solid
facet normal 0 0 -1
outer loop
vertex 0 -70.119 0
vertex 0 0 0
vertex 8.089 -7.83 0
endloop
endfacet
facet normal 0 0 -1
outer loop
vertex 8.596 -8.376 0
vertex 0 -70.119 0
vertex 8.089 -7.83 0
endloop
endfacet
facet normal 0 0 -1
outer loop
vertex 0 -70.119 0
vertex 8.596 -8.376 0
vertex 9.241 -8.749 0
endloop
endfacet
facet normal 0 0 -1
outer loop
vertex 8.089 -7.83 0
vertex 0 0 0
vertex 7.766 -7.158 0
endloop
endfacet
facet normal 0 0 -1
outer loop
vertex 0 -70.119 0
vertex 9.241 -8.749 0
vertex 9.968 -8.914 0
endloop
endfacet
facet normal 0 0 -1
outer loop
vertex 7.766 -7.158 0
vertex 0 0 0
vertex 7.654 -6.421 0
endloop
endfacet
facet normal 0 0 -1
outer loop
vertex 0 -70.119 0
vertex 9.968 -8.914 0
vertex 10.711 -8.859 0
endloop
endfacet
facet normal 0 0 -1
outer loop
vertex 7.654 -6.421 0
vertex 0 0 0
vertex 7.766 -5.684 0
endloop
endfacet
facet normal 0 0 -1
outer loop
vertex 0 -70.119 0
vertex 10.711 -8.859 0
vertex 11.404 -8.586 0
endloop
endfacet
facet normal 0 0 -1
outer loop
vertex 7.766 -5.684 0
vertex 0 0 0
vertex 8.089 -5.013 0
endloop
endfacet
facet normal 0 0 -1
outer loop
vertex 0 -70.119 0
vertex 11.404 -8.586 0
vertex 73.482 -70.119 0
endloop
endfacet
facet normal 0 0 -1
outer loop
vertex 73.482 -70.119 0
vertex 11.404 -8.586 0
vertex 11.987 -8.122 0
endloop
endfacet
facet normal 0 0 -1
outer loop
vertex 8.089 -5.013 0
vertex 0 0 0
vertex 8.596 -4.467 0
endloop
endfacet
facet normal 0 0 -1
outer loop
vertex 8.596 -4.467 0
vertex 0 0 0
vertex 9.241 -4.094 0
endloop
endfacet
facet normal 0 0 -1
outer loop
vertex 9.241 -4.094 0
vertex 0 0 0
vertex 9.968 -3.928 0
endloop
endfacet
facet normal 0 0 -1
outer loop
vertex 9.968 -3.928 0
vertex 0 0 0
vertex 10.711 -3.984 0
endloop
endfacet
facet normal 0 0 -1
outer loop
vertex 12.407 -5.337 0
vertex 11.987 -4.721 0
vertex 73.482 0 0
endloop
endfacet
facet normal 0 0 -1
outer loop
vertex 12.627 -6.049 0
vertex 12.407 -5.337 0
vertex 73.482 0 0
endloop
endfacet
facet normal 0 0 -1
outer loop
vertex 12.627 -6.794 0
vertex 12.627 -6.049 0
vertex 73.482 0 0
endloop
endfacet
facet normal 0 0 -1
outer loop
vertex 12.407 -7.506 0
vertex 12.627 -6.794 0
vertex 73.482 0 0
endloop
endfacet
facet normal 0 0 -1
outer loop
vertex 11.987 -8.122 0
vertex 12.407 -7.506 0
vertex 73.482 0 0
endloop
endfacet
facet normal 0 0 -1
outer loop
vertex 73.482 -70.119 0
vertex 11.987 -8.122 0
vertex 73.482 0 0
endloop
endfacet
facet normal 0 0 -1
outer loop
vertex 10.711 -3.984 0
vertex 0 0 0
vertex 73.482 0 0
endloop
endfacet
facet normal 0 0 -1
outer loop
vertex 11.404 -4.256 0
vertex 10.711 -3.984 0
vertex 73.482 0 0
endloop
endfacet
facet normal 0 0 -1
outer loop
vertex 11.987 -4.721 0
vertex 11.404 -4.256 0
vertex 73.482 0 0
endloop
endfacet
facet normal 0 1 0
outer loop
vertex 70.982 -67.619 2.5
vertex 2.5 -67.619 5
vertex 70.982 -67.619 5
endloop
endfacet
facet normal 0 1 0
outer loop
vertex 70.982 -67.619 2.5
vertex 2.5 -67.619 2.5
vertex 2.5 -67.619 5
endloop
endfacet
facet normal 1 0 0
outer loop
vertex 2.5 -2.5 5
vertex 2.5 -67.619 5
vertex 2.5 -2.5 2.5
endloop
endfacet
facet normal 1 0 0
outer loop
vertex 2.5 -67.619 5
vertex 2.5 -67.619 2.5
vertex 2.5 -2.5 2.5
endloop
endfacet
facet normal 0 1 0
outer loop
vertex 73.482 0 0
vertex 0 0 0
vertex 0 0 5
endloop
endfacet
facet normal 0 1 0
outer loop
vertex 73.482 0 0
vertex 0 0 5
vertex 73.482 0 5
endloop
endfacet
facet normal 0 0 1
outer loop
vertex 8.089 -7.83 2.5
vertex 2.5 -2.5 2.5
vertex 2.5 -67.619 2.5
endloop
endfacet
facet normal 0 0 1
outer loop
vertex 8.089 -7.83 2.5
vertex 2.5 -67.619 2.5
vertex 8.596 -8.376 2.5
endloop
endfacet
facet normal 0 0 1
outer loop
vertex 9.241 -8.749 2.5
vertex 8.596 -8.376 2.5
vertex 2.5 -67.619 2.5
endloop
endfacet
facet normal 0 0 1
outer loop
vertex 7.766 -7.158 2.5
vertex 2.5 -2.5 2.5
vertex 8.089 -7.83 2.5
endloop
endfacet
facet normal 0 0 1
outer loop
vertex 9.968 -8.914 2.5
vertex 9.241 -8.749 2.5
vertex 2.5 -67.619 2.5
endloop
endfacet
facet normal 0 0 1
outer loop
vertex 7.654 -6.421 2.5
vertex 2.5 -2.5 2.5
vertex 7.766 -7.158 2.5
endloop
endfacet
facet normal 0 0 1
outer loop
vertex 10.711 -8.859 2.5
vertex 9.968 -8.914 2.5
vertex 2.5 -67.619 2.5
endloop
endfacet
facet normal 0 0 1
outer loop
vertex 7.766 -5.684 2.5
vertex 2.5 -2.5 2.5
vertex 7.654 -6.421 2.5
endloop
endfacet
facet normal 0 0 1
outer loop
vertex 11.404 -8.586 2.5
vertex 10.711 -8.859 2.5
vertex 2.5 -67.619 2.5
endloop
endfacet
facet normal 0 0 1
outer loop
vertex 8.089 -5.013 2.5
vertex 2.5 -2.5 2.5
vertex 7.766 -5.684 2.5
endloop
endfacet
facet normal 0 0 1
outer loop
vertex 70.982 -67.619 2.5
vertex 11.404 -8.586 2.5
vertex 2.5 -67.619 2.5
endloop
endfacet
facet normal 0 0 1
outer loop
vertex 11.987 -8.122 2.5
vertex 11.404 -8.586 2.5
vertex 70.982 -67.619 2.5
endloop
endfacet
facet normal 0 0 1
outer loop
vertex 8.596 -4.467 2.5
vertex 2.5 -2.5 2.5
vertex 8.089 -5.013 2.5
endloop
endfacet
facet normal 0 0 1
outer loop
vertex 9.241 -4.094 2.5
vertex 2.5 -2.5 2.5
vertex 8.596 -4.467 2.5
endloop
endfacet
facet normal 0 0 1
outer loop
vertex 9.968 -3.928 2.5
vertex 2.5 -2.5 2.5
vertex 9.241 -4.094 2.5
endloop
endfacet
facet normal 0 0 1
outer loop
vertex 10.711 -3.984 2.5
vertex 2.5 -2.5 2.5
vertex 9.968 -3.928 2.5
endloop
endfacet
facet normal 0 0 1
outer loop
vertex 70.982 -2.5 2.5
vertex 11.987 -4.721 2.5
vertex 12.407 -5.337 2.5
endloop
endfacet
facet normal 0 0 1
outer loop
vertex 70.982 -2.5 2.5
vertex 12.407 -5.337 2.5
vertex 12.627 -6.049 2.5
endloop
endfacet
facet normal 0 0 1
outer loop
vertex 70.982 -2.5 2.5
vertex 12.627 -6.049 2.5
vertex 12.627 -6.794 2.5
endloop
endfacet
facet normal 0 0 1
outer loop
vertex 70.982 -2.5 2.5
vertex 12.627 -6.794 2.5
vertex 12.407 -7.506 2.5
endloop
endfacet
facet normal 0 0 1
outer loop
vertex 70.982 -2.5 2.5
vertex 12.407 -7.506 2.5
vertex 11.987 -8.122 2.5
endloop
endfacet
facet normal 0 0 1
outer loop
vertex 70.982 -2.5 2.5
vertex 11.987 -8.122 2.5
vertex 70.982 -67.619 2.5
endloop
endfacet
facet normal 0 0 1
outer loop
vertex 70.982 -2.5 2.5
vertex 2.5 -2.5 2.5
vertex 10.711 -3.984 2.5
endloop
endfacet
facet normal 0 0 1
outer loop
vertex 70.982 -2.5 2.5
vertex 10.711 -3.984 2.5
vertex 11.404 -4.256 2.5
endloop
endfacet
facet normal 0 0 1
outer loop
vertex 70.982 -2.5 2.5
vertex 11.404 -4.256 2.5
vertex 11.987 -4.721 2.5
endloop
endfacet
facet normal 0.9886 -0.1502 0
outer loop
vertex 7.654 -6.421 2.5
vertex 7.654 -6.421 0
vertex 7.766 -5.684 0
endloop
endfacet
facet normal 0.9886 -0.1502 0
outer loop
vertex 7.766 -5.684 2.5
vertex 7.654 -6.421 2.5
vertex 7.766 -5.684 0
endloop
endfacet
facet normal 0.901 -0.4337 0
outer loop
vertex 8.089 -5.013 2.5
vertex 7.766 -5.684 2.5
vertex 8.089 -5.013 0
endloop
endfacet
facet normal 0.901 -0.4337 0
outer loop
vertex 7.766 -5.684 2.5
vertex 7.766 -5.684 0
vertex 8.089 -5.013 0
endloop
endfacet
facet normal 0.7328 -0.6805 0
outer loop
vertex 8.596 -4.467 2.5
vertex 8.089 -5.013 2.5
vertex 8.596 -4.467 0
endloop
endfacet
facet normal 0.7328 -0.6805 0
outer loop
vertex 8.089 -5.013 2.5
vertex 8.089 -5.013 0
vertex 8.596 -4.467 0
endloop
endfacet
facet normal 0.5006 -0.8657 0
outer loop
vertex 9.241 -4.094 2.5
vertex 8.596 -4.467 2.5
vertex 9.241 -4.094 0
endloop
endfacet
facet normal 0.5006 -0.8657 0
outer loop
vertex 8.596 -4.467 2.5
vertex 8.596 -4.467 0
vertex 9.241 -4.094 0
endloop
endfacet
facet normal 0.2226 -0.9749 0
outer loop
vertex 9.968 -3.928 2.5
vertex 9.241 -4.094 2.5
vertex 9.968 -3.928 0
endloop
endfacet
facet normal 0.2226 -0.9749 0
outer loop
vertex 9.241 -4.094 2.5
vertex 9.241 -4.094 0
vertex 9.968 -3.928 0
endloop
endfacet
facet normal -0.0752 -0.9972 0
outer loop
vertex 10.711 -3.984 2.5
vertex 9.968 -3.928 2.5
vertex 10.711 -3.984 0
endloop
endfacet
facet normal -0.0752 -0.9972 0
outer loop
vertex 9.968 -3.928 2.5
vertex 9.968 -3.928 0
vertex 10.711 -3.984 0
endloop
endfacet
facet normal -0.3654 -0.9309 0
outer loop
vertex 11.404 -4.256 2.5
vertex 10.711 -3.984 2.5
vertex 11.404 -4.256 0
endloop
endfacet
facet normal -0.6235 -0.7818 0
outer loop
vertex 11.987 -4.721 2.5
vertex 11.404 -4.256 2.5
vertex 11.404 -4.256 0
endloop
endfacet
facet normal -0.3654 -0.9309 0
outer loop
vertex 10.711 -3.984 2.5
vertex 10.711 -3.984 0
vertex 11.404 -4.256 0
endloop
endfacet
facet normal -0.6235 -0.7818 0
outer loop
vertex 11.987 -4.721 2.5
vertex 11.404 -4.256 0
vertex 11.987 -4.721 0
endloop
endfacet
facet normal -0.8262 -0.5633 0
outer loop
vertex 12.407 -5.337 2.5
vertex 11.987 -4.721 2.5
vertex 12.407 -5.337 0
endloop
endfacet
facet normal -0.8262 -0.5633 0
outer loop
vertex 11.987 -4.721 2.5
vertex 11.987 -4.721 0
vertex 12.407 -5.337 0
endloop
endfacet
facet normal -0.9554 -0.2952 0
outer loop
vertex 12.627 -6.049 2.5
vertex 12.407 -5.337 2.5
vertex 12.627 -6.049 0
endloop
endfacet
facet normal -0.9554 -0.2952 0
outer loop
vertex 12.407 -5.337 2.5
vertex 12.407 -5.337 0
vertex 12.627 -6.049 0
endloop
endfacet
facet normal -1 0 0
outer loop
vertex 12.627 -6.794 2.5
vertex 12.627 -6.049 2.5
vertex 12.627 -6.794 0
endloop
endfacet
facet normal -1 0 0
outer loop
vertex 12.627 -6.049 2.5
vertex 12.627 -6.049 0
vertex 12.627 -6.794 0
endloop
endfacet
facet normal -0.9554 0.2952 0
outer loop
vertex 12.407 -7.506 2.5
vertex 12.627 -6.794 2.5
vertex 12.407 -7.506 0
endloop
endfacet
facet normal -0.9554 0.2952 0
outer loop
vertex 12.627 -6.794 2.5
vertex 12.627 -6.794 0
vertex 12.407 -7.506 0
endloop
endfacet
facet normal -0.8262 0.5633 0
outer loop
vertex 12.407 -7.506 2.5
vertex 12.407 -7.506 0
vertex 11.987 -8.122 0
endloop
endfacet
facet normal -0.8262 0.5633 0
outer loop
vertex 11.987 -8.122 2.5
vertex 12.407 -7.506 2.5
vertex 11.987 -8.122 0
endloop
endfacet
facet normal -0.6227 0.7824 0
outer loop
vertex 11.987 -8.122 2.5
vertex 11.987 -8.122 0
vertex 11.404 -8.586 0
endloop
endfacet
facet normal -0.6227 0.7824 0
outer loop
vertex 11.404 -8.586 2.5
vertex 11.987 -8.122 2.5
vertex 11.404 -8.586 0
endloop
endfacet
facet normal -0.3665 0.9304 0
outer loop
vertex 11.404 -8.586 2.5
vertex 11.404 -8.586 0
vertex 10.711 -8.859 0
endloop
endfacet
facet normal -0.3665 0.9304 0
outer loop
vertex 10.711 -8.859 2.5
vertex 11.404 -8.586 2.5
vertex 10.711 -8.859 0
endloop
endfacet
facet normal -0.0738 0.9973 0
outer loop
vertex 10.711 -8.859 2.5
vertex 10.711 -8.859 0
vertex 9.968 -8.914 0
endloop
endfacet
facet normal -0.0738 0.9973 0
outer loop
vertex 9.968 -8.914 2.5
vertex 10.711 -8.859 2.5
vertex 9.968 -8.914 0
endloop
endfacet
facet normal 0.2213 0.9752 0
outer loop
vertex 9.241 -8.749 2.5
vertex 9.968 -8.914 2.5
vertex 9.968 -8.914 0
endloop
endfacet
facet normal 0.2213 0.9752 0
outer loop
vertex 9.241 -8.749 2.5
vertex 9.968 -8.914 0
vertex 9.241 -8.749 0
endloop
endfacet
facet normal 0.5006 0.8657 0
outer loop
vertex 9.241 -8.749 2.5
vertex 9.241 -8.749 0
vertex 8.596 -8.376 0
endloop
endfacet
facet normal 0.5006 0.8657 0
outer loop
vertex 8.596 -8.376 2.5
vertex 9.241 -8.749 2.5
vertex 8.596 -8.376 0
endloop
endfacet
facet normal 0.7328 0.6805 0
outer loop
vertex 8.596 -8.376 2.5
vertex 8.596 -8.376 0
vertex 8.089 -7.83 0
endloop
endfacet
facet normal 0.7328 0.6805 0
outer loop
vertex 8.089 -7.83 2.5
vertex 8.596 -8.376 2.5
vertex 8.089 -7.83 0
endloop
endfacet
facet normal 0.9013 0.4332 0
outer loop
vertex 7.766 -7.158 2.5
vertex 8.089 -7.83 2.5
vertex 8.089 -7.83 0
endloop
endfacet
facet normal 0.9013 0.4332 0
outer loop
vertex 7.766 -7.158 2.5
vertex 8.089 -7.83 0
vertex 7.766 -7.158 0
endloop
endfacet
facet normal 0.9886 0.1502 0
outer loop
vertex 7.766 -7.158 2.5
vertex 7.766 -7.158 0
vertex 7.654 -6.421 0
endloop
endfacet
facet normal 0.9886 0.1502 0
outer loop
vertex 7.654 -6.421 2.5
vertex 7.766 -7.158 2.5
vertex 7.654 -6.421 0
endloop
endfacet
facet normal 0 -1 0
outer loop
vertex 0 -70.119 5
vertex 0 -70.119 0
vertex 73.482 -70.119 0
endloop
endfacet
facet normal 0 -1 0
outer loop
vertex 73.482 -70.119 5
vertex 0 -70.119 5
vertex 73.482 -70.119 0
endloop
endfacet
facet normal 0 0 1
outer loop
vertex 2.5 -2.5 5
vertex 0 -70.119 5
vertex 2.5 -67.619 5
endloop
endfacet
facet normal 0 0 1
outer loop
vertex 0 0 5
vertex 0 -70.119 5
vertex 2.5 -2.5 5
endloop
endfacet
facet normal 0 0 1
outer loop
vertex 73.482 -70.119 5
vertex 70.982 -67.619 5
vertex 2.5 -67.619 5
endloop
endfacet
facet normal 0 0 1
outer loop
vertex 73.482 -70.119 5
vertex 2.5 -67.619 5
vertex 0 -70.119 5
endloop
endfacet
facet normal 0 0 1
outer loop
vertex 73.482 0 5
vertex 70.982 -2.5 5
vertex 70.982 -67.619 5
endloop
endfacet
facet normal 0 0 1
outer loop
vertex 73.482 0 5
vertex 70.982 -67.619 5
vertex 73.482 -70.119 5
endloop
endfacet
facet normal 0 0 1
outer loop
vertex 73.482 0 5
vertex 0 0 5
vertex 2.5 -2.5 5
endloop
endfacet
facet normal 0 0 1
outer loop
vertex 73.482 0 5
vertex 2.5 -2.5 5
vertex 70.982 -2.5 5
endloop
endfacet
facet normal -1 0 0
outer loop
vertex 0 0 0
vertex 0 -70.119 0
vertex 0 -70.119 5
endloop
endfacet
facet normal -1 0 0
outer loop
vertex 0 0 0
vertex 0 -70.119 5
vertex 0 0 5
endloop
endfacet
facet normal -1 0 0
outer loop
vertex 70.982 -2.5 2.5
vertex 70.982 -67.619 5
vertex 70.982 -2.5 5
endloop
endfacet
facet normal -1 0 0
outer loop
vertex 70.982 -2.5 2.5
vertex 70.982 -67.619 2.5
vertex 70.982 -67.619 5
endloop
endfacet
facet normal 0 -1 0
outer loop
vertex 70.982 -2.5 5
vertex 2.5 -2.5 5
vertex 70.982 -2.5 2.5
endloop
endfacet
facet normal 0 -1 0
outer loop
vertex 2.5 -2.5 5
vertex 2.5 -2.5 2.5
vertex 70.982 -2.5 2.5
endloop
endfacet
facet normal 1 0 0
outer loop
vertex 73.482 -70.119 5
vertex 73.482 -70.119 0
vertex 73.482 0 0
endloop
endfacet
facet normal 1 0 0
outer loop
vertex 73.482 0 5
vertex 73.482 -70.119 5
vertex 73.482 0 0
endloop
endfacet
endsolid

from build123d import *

# Parameters (mm, degrees)
F0_W     = 73.482446
F0_H     = 70.119202
F1_DEPTH = 5
F2_T     = -2.5
F4_D     = 5


with BuildPart() as f1:
    # F0 (on Top) → F1 (new body)
    with BuildSketch(Plane.XY):
        with Locations((36.741223, -35.059601)):
            Rectangle(F0_W, F0_H)
    extrude(amount=F1_DEPTH)

    # F2
    f2_openings = [f1.faces().sort_by_distance(p)[0] for p in [
        (36.741223, -35.059601, 5),
    ]]
    offset(amount=F2_T, openings=f2_openings)

    # F4 (through all)
    with Locations(Plane.XY.offset(2.5)):
        with Locations((10.154494, -6.421357)):
            Hole(F4_D / 2)


solid = f1.part
